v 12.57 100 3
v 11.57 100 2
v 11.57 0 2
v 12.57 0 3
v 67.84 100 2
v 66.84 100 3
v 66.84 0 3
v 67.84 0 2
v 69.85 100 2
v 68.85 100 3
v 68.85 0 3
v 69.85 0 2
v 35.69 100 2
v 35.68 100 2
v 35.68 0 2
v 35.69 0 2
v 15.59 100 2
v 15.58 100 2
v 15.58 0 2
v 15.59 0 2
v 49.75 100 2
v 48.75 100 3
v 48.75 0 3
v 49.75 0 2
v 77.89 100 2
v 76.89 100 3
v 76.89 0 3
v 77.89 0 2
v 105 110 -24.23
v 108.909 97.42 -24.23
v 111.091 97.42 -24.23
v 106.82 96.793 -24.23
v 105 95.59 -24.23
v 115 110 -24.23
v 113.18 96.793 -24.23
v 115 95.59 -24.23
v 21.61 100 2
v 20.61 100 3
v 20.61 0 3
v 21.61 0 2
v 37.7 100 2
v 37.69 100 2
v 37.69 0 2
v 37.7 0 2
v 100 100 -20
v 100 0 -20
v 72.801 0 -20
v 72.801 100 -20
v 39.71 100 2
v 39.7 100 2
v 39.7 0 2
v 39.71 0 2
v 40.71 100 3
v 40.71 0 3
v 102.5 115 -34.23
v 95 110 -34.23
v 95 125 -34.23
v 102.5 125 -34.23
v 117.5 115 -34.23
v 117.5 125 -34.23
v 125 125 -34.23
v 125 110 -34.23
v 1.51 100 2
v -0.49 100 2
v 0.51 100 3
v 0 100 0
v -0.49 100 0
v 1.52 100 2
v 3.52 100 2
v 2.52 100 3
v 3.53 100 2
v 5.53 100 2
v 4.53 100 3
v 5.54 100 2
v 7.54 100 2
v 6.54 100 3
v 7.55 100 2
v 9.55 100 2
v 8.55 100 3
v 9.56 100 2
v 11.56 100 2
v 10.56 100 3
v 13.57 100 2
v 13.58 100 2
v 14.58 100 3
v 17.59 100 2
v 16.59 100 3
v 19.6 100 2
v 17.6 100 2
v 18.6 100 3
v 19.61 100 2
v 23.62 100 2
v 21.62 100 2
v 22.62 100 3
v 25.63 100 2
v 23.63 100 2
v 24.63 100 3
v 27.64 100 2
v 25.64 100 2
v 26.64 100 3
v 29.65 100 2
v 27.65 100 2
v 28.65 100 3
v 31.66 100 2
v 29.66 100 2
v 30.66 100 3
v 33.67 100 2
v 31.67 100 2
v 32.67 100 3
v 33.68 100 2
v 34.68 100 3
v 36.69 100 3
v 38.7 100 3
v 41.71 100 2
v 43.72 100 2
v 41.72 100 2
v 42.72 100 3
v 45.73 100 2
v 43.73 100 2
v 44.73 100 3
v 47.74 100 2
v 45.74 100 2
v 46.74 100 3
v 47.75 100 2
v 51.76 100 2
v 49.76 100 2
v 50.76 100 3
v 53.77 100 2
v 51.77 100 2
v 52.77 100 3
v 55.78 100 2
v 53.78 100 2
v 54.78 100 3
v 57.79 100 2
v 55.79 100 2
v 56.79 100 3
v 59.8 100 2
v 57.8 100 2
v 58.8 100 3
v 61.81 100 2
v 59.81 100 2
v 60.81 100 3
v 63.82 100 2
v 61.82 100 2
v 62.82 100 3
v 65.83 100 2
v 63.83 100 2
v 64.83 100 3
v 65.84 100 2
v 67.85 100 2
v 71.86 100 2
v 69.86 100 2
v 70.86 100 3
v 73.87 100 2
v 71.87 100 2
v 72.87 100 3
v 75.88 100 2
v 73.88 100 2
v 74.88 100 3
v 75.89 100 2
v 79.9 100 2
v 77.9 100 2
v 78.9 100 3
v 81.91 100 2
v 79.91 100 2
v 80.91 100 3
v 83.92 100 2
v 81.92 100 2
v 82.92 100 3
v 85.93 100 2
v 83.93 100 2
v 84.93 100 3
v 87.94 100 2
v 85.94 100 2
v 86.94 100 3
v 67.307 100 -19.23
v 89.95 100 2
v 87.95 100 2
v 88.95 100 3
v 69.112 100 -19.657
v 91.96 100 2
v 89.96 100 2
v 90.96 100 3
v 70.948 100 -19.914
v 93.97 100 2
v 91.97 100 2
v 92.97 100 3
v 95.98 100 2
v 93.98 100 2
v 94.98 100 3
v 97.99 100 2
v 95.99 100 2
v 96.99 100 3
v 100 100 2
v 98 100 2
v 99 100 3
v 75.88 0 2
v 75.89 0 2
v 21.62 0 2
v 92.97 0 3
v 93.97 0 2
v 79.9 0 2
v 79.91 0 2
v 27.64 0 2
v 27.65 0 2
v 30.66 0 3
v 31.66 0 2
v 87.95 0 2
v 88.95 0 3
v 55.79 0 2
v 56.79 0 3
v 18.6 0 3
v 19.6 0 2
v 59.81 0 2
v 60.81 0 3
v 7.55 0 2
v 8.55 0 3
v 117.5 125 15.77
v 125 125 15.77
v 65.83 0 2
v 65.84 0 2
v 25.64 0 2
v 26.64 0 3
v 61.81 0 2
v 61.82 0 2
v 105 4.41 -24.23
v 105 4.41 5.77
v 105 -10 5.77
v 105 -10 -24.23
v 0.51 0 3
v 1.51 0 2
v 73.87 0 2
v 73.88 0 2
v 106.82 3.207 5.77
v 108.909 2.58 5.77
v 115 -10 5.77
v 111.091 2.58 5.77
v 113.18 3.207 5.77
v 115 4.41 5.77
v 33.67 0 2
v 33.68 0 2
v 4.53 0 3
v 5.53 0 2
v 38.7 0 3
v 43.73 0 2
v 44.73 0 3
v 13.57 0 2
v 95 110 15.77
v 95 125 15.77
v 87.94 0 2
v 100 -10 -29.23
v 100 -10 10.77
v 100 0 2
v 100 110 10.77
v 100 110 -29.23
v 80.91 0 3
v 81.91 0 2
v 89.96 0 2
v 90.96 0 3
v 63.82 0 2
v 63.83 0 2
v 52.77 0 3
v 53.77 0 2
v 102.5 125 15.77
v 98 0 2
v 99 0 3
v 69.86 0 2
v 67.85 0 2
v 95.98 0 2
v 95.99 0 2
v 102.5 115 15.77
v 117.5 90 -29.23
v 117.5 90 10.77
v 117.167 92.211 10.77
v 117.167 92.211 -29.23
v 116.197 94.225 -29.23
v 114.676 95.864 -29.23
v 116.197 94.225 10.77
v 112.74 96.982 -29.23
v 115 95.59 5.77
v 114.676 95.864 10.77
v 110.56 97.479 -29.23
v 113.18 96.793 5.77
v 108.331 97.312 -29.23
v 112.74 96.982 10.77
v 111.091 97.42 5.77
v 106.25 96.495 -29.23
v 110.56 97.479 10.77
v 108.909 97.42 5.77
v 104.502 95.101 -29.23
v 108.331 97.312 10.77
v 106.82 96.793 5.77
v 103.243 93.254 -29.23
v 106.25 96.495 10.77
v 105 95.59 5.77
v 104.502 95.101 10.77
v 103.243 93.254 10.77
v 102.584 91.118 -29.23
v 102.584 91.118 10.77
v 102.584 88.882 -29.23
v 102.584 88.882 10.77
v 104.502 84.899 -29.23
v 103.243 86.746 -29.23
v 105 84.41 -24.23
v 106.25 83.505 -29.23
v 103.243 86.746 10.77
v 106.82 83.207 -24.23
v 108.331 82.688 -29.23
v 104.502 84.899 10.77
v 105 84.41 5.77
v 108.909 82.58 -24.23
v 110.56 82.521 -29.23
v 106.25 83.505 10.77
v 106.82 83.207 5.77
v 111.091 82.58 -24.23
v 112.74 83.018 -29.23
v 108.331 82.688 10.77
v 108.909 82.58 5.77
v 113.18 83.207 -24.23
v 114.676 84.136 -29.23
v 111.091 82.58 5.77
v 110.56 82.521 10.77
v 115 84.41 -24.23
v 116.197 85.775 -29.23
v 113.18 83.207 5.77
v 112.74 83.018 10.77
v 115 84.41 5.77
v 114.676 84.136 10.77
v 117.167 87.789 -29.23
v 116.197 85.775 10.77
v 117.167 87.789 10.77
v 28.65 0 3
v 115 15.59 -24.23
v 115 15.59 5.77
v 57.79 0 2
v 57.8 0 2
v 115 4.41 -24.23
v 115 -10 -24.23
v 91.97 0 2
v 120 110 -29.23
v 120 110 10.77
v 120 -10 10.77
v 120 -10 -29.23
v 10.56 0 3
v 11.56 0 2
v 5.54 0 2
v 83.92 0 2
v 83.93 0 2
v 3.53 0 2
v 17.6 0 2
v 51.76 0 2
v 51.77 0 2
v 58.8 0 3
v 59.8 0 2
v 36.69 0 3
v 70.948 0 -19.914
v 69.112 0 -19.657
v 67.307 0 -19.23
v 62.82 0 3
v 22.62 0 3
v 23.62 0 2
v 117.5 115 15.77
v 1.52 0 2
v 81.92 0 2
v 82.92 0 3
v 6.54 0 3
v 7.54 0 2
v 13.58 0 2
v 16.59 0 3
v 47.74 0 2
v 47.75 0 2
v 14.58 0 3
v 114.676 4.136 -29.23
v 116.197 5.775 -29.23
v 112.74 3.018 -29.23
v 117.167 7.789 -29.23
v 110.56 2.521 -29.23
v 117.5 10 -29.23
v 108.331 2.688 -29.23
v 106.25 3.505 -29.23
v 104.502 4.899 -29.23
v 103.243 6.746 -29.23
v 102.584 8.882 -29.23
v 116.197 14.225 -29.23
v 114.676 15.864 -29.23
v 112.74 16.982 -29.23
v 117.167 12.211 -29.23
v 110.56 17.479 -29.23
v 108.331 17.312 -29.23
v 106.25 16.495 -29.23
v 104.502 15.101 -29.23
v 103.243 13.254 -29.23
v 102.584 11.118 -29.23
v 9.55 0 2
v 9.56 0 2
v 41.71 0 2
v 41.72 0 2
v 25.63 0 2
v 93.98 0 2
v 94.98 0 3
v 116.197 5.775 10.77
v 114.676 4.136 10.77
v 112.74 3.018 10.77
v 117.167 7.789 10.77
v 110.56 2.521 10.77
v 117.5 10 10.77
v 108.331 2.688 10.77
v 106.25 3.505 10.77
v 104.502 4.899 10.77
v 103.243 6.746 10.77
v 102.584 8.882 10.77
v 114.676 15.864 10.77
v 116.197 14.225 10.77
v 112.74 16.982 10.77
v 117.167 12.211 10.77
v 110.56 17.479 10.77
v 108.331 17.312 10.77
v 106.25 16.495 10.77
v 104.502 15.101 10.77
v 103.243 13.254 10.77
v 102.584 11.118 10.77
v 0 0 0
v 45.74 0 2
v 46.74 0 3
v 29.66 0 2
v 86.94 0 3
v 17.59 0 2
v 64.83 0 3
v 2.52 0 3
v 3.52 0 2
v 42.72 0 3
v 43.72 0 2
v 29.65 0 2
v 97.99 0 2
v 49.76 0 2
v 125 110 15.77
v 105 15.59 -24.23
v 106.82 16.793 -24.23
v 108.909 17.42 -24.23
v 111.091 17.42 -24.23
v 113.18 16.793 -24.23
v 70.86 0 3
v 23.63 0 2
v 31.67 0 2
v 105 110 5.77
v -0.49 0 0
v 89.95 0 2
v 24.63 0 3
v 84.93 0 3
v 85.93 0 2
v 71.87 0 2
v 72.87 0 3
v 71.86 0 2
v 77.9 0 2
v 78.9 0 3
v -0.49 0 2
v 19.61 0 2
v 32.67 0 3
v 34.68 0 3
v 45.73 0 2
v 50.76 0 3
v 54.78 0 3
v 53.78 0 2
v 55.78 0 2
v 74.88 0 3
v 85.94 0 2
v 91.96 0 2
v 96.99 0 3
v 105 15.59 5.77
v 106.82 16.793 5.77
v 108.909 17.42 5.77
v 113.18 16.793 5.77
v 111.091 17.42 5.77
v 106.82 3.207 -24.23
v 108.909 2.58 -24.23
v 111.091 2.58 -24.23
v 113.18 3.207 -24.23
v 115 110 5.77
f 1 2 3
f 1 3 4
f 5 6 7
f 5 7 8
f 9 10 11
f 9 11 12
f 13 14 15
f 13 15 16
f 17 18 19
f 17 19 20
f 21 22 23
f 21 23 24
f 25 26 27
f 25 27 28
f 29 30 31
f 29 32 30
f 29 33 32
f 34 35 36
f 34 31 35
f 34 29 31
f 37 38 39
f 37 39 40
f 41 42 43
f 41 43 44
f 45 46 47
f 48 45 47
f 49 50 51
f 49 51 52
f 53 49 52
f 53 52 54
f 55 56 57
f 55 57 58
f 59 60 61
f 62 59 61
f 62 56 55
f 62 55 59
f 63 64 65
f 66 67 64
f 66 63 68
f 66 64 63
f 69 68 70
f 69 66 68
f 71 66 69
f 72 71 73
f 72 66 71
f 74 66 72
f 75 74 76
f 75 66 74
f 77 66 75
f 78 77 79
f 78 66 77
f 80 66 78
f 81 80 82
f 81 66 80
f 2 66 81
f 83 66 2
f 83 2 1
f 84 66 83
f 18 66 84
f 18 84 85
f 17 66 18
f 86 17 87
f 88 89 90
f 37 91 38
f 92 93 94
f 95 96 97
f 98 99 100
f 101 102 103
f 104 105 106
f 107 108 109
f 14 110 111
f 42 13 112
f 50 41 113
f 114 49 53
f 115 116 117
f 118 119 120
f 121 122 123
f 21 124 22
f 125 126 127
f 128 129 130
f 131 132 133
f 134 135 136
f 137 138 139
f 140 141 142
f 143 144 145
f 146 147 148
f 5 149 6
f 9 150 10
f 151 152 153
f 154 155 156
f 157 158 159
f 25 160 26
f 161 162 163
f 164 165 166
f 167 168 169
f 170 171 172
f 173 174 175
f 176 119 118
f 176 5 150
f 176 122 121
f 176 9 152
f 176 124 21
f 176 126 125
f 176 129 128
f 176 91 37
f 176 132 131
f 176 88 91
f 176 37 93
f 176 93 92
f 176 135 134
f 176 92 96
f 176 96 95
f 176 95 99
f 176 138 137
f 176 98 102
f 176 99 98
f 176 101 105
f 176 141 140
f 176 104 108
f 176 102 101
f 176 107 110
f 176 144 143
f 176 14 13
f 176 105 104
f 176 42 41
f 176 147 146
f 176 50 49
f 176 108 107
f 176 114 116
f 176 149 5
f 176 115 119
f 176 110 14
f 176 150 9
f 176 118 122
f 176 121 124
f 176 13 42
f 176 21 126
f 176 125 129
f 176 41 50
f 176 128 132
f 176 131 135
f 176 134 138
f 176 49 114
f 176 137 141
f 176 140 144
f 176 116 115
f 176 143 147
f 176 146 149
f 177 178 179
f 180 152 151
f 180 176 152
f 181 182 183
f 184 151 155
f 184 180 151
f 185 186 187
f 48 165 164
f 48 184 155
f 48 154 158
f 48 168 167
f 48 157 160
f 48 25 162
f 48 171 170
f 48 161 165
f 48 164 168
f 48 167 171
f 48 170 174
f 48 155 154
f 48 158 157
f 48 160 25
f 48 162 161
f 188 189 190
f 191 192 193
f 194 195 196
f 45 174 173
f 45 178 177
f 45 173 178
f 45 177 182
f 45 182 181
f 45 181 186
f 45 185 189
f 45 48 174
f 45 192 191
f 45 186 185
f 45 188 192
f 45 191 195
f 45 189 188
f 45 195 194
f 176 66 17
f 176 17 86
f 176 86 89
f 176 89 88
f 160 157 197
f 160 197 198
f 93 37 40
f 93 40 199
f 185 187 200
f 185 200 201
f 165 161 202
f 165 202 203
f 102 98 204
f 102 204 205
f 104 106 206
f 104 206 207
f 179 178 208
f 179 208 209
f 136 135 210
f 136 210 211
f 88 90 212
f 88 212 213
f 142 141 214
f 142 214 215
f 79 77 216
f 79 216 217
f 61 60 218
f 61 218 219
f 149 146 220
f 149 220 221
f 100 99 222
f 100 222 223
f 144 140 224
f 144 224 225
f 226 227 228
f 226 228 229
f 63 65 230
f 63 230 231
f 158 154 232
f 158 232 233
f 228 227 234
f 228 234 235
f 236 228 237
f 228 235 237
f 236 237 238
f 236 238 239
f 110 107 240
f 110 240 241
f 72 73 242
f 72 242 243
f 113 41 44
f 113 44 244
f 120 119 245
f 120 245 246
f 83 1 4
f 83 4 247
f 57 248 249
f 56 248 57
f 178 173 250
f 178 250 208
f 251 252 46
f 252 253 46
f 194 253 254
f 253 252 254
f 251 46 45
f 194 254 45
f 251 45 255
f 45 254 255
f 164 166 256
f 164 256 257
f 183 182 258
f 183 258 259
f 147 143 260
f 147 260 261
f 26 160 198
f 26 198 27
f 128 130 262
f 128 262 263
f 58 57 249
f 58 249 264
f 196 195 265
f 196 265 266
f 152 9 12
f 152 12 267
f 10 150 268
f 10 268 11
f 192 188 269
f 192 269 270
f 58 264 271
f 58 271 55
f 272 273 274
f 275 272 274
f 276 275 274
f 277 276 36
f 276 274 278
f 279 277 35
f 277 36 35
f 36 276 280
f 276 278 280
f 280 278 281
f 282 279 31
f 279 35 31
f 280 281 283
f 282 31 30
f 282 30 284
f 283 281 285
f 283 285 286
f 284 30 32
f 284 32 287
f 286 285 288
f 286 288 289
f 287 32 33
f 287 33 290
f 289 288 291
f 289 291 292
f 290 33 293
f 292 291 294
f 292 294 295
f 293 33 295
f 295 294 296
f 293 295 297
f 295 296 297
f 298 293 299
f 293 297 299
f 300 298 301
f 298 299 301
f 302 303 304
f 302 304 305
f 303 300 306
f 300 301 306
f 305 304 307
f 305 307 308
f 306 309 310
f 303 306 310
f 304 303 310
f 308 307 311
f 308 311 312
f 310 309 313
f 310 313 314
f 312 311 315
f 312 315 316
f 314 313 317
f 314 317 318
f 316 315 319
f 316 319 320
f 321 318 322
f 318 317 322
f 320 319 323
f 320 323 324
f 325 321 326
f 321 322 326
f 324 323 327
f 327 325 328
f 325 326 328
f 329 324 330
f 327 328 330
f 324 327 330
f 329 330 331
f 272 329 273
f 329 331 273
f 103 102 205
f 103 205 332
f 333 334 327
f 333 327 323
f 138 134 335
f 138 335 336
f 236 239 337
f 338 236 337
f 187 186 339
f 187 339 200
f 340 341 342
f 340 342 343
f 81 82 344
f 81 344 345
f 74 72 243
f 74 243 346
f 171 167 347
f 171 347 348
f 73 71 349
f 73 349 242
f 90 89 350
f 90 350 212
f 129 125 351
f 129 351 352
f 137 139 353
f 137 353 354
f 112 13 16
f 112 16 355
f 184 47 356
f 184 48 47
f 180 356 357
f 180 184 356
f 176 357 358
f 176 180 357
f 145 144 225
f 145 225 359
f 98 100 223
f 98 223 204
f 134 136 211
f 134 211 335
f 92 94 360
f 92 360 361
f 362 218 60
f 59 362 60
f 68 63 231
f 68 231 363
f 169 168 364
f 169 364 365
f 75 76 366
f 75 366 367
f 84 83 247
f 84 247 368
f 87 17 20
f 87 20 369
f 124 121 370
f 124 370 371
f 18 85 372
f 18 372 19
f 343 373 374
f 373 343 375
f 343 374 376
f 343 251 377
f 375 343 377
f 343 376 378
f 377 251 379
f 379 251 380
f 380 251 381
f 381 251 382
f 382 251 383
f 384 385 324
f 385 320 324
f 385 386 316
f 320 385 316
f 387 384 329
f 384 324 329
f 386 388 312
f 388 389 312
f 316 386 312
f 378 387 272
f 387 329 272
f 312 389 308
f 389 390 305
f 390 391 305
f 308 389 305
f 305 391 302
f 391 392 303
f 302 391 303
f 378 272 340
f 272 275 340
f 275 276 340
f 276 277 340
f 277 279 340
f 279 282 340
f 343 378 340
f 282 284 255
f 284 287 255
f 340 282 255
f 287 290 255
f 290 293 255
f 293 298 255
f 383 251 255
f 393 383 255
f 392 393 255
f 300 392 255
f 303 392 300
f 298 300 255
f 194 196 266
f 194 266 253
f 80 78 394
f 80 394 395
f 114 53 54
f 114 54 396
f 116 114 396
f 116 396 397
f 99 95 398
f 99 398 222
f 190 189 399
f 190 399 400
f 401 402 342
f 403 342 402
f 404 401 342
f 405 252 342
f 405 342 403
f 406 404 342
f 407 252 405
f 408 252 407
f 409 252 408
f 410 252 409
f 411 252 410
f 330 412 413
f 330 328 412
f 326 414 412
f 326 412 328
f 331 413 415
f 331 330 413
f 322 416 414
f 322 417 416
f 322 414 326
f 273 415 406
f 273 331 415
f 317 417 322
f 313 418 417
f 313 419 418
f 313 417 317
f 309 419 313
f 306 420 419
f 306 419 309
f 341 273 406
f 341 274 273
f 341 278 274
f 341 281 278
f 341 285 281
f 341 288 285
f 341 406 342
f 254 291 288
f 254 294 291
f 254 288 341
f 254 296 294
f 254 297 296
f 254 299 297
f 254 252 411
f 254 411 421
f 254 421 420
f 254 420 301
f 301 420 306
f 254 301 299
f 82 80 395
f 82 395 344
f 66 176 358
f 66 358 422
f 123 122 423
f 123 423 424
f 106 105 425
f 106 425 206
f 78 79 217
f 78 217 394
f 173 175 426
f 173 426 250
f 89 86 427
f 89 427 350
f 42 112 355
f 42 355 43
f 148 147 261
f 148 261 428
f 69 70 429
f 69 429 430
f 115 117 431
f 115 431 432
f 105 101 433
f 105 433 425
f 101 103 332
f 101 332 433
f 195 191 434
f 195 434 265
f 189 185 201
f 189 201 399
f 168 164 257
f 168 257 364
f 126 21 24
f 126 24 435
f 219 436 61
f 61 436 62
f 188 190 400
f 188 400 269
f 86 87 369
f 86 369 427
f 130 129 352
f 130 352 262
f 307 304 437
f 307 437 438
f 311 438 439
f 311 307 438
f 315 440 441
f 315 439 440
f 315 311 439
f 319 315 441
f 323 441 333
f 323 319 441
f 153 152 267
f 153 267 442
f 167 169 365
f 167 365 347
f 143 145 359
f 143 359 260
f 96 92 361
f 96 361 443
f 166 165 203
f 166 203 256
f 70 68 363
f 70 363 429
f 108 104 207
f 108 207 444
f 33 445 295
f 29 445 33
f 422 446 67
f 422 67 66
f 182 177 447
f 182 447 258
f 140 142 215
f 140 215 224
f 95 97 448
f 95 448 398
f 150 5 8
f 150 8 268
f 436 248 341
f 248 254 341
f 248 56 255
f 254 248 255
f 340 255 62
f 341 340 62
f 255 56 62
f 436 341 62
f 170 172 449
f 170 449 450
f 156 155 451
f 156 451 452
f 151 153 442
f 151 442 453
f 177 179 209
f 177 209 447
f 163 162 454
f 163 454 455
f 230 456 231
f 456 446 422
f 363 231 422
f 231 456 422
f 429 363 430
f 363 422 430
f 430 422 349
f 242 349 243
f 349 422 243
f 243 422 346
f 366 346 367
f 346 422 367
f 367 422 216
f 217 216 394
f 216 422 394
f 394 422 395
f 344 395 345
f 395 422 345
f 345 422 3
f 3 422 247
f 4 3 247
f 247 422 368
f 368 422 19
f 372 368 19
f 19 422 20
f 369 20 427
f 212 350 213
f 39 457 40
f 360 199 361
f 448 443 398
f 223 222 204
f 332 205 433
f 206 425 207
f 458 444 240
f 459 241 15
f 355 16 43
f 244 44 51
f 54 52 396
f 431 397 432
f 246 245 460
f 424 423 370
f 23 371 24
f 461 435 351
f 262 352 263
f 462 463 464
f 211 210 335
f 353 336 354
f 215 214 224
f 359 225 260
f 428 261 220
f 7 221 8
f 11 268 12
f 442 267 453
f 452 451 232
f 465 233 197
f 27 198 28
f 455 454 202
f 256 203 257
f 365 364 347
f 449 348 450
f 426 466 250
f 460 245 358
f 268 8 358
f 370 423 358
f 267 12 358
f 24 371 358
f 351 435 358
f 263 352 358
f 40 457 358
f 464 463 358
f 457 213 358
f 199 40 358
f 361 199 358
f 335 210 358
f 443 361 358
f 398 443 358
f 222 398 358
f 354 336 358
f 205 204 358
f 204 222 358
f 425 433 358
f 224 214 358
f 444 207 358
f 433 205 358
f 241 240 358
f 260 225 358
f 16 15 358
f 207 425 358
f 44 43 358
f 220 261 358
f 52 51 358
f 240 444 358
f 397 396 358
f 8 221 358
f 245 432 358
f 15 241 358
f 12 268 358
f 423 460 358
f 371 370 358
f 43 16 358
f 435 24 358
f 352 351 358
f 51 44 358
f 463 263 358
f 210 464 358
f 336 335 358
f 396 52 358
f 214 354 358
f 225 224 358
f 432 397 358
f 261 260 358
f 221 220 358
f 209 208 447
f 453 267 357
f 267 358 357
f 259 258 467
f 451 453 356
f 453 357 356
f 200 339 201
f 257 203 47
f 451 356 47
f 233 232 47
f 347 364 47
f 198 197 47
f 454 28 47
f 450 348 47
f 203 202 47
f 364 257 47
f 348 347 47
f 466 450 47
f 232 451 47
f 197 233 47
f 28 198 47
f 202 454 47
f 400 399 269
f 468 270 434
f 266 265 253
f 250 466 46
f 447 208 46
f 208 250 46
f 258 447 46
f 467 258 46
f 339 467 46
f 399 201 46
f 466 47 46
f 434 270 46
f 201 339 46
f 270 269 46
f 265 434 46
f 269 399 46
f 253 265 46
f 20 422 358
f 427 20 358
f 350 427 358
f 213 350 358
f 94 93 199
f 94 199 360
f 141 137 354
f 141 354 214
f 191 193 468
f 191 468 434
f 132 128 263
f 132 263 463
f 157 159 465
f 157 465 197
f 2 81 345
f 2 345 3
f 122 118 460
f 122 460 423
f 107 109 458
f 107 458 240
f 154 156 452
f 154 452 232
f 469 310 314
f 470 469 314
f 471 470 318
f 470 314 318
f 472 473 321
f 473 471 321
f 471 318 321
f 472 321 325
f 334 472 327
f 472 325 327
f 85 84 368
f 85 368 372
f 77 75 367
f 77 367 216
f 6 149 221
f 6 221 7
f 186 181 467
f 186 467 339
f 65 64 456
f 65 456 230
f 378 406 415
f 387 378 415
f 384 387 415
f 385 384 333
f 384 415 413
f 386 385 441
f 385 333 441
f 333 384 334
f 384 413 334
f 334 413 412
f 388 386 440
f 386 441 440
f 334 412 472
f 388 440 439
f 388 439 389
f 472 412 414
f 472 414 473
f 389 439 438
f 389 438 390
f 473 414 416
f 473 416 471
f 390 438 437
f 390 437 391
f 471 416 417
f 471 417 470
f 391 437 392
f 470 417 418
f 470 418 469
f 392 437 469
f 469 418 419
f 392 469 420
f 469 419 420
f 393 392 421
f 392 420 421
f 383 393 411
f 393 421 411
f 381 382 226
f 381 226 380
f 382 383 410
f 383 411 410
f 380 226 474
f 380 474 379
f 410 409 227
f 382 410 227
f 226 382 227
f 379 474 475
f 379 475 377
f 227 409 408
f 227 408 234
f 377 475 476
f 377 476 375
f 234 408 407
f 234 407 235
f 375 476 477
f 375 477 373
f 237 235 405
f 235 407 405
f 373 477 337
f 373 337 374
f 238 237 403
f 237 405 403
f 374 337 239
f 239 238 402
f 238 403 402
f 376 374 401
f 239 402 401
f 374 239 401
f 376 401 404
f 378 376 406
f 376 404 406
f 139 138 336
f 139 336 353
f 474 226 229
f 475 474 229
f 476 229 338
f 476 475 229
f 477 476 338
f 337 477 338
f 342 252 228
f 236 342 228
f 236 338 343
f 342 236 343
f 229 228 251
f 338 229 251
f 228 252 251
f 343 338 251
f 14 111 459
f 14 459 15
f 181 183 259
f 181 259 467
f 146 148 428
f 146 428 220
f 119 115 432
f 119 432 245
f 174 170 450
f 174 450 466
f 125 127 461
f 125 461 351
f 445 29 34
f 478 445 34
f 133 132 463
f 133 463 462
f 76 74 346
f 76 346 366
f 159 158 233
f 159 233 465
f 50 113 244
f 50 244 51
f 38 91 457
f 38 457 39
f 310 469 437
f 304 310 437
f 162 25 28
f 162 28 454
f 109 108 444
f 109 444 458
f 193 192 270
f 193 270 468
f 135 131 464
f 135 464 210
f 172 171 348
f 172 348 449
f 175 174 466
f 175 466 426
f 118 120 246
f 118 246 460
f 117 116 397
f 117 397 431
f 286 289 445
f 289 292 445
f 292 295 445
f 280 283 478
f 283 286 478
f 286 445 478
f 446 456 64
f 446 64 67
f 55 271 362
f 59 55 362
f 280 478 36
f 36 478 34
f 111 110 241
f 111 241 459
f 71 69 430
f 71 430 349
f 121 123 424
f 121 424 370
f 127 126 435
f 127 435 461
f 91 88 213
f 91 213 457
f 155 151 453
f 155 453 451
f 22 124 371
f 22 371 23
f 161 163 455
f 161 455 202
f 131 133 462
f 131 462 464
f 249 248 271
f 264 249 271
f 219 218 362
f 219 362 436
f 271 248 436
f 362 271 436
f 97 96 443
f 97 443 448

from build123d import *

# Parameters (mm, degrees)
BOSS_EXTRUDE1_DEPTH = 100
FILLET1_R           = 20
SKETCH5_W           = 40
SKETCH5_H           = 120
BOSS_EXTRUDE2_DEPTH = 20
SKETCH6_W           = 10
SKETCH6_H           = 30
CUT_EXTRUDE1_DEPTH  = 120
SKETCH7_W           = 100
SKETCH7_H           = 100
BOSS_EXTRUDE3_DEPTH = 2
BOSS_EXTRUDE4_DEPTH = 100
SKETCH11_W          = 0.49
SKETCH11_H          = 2
BOSS_EXTRUDE5_DEPTH = 100
SKETCH12_R          = 7.5
CUT_EXTRUDE2_DEPTH  = 40
SKETCH15_W          = 30
SKETCH15_H          = 50
BOSS_EXTRUDE6_DEPTH = 15
SKETCH16_W          = 15
SKETCH16_H          = 50
CUT_EXTRUDE3_DEPTH  = 10


with BuildPart() as part:
    # Sketch3 → Boss-Extrude1 (new body)
    with BuildSketch(Plane(origin=(0, 0, 0), x_dir=(1, 0, 0), z_dir=(0, 1, 0))):
        Polygon((0, 0), (100, 0), (100, 20), (70, 20), align=None)
    extrude(amount=BOSS_EXTRUDE1_DEPTH)

    # Fillet1
    fillet1_edges = [part.edges().sort_by_distance(p)[0] for p in [
        (70, 50, -20),
    ]]
    fillet(fillet1_edges, radius=FILLET1_R)

    # Sketch5 → Boss-Extrude2 (add)
    with BuildSketch(Plane(origin=(100, 0, 0), x_dir=(0, 0, -1), z_dir=(1, 0, 0))):
        with Locations((9.230478953, 50)):
            Rectangle(SKETCH5_W, SKETCH5_H)
    extrude(amount=BOSS_EXTRUDE2_DEPTH)

    # Sketch6 → Cut-Extrude1 (cut)
    with BuildSketch(Plane(origin=(0, 110, 0), x_dir=(1, 0, 0), z_dir=(0, 1, 0))):
        with Locations((110, 9.230478953)):
            Rectangle(SKETCH6_W, SKETCH6_H)
    extrude(amount=-CUT_EXTRUDE1_DEPTH, mode=Mode.SUBTRACT)

    # Sketch7 → Boss-Extrude3 (add)
    with BuildSketch(Plane.XY):
        with Locations((50, 50)):
            Rectangle(SKETCH7_W, SKETCH7_H)
    extrude(amount=BOSS_EXTRUDE3_DEPTH)

    # Sketch10 → Boss-Extrude4 (add)
    with BuildSketch(Plane(origin=(0, 100, 0), x_dir=(1, 0, 0), z_dir=(0, 1, 0))):
        Polygon((100, -2), (98, -2), (99, -3), align=None)
        Polygon((95.99, -2), (96.99, -3), (97.99, -2), align=None)
        Polygon((93.98, -2), (94.98, -3), (95.98, -2), align=None)
        Polygon((91.97, -2), (92.97, -3), (93.97, -2), align=None)
        Polygon((89.96, -2), (90.96, -3), (91.96, -2), align=None)
        Polygon((87.95, -2), (88.95, -3), (89.95, -2), align=None)
        Polygon((85.94, -2), (86.94, -3), (87.94, -2), align=None)
        Polygon((83.93, -2), (84.93, -3), (85.93, -2), align=None)
        Polygon((81.92, -2), (82.92, -3), (83.92, -2), align=None)
        Polygon((79.91, -2), (80.91, -3), (81.91, -2), align=None)
        Polygon((77.9, -2), (78.9, -3), (79.9, -2), align=None)
        Polygon((75.89, -2), (76.89, -3), (77.89, -2), align=None)
        Polygon((73.88, -2), (74.88, -3), (75.88, -2), align=None)
        Polygon((71.87, -2), (72.87, -3), (73.87, -2), align=None)
        Polygon((69.86, -2), (70.86, -3), (71.86, -2), align=None)
        Polygon((67.85, -2), (68.85, -3), (69.85, -2), align=None)
        Polygon((65.84, -2), (66.84, -3), (67.84, -2), align=None)
        Polygon((63.83, -2), (64.83, -3), (65.83, -2), align=None)
        Polygon((61.82, -2), (62.82, -3), (63.82, -2), align=None)
        Polygon((59.81, -2), (60.81, -3), (61.81, -2), align=None)
        Polygon((57.8, -2), (58.8, -3), (59.8, -2), align=None)
        Polygon((55.79, -2), (56.79, -3), (57.79, -2), align=None)
        Polygon((53.78, -2), (54.78, -3), (55.78, -2), align=None)
        Polygon((51.77, -2), (52.77, -3), (53.77, -2), align=None)
        Polygon((49.76, -2), (50.76, -3), (51.76, -2), align=None)
        Polygon((47.75, -2), (48.75, -3), (49.75, -2), align=None)
        Polygon((45.74, -2), (46.74, -3), (47.74, -2), align=None)
        Polygon((43.73, -2), (44.73, -3), (45.73, -2), align=None)
        Polygon((41.72, -2), (42.72, -3), (43.72, -2), align=None)
        Polygon((39.71, -2), (40.71, -3), (41.71, -2), align=None)
        Polygon((37.7, -2), (38.7, -3), (39.7, -2), align=None)
        Polygon((35.69, -2), (36.69, -3), (37.69, -2), align=None)
        Polygon((33.68, -2), (34.68, -3), (35.68, -2), align=None)
        Polygon((31.67, -2), (32.67, -3), (33.67, -2), align=None)
        Polygon((29.66, -2), (30.66, -3), (31.66, -2), align=None)
        Polygon((27.65, -2), (28.65, -3), (29.65, -2), align=None)
        Polygon((25.64, -2), (26.64, -3), (27.64, -2), align=None)
        Polygon((23.63, -2), (24.63, -3), (25.63, -2), align=None)
        Polygon((21.62, -2), (22.62, -3), (23.62, -2), align=None)
        Polygon((19.61, -2), (20.61, -3), (21.61, -2), align=None)
        Polygon((17.6, -2), (18.6, -3), (19.6, -2), align=None)
        Polygon((15.59, -2), (16.59, -3), (17.59, -2), align=None)
        Polygon((13.58, -2), (14.58, -3), (15.58, -2), align=None)
        Polygon((11.57, -2), (12.57, -3), (13.57, -2), align=None)
        Polygon((9.56, -2), (10.56, -3), (11.56, -2), align=None)
        Polygon((7.55, -2), (8.55, -3), (9.55, -2), align=None)
        Polygon((5.54, -2), (6.54, -3), (7.54, -2), align=None)
        Polygon((3.53, -2), (4.53, -3), (5.53, -2), align=None)
        Polygon((1.52, -2), (2.52, -3), (3.52, -2), align=None)
        Polygon((-0.49, -2), (0.51, -3), (1.51, -2), align=None)
    extrude(amount=-BOSS_EXTRUDE4_DEPTH)

    # Sketch11 → Boss-Extrude5 (add)
    with BuildSketch(Plane(origin=(0, 100, 0), x_dir=(1, 0, 0), z_dir=(0, 1, 0))):
        with Locations((-0.245, -1)):
            Rectangle(SKETCH11_W, SKETCH11_H)
    extrude(amount=-BOSS_EXTRUDE5_DEPTH)

    # Sketch12 → Cut-Extrude2 (cut)
    with BuildSketch(Plane.XY.offset(10.769521047)):
        with Locations((110, 10)):
            Circle(SKETCH12_R)
        with Locations((110, 90)):
            Circle(SKETCH12_R)
    extrude(amount=-CUT_EXTRUDE2_DEPTH, mode=Mode.SUBTRACT)

    # Sketch15 → Boss-Extrude6 (add)
    with BuildSketch(Plane(origin=(0, 110, 0), x_dir=(1, 0, 0), z_dir=(0, 1, 0))):
        with Locations((110, 9.230478953)):
            Rectangle(SKETCH15_W, SKETCH15_H)
    extrude(amount=BOSS_EXTRUDE6_DEPTH)

    # Sketch16 → Cut-Extrude3 (cut)
    with BuildSketch(Plane(origin=(0, 125, 0), x_dir=(1, 0, 0), z_dir=(0, 1, 0))):
        with Locations((110, 9.230478953)):
            Rectangle(SKETCH16_W, SKETCH16_H)
    extrude(amount=-CUT_EXTRUDE3_DEPTH, mode=Mode.SUBTRACT)


solid = part.part
